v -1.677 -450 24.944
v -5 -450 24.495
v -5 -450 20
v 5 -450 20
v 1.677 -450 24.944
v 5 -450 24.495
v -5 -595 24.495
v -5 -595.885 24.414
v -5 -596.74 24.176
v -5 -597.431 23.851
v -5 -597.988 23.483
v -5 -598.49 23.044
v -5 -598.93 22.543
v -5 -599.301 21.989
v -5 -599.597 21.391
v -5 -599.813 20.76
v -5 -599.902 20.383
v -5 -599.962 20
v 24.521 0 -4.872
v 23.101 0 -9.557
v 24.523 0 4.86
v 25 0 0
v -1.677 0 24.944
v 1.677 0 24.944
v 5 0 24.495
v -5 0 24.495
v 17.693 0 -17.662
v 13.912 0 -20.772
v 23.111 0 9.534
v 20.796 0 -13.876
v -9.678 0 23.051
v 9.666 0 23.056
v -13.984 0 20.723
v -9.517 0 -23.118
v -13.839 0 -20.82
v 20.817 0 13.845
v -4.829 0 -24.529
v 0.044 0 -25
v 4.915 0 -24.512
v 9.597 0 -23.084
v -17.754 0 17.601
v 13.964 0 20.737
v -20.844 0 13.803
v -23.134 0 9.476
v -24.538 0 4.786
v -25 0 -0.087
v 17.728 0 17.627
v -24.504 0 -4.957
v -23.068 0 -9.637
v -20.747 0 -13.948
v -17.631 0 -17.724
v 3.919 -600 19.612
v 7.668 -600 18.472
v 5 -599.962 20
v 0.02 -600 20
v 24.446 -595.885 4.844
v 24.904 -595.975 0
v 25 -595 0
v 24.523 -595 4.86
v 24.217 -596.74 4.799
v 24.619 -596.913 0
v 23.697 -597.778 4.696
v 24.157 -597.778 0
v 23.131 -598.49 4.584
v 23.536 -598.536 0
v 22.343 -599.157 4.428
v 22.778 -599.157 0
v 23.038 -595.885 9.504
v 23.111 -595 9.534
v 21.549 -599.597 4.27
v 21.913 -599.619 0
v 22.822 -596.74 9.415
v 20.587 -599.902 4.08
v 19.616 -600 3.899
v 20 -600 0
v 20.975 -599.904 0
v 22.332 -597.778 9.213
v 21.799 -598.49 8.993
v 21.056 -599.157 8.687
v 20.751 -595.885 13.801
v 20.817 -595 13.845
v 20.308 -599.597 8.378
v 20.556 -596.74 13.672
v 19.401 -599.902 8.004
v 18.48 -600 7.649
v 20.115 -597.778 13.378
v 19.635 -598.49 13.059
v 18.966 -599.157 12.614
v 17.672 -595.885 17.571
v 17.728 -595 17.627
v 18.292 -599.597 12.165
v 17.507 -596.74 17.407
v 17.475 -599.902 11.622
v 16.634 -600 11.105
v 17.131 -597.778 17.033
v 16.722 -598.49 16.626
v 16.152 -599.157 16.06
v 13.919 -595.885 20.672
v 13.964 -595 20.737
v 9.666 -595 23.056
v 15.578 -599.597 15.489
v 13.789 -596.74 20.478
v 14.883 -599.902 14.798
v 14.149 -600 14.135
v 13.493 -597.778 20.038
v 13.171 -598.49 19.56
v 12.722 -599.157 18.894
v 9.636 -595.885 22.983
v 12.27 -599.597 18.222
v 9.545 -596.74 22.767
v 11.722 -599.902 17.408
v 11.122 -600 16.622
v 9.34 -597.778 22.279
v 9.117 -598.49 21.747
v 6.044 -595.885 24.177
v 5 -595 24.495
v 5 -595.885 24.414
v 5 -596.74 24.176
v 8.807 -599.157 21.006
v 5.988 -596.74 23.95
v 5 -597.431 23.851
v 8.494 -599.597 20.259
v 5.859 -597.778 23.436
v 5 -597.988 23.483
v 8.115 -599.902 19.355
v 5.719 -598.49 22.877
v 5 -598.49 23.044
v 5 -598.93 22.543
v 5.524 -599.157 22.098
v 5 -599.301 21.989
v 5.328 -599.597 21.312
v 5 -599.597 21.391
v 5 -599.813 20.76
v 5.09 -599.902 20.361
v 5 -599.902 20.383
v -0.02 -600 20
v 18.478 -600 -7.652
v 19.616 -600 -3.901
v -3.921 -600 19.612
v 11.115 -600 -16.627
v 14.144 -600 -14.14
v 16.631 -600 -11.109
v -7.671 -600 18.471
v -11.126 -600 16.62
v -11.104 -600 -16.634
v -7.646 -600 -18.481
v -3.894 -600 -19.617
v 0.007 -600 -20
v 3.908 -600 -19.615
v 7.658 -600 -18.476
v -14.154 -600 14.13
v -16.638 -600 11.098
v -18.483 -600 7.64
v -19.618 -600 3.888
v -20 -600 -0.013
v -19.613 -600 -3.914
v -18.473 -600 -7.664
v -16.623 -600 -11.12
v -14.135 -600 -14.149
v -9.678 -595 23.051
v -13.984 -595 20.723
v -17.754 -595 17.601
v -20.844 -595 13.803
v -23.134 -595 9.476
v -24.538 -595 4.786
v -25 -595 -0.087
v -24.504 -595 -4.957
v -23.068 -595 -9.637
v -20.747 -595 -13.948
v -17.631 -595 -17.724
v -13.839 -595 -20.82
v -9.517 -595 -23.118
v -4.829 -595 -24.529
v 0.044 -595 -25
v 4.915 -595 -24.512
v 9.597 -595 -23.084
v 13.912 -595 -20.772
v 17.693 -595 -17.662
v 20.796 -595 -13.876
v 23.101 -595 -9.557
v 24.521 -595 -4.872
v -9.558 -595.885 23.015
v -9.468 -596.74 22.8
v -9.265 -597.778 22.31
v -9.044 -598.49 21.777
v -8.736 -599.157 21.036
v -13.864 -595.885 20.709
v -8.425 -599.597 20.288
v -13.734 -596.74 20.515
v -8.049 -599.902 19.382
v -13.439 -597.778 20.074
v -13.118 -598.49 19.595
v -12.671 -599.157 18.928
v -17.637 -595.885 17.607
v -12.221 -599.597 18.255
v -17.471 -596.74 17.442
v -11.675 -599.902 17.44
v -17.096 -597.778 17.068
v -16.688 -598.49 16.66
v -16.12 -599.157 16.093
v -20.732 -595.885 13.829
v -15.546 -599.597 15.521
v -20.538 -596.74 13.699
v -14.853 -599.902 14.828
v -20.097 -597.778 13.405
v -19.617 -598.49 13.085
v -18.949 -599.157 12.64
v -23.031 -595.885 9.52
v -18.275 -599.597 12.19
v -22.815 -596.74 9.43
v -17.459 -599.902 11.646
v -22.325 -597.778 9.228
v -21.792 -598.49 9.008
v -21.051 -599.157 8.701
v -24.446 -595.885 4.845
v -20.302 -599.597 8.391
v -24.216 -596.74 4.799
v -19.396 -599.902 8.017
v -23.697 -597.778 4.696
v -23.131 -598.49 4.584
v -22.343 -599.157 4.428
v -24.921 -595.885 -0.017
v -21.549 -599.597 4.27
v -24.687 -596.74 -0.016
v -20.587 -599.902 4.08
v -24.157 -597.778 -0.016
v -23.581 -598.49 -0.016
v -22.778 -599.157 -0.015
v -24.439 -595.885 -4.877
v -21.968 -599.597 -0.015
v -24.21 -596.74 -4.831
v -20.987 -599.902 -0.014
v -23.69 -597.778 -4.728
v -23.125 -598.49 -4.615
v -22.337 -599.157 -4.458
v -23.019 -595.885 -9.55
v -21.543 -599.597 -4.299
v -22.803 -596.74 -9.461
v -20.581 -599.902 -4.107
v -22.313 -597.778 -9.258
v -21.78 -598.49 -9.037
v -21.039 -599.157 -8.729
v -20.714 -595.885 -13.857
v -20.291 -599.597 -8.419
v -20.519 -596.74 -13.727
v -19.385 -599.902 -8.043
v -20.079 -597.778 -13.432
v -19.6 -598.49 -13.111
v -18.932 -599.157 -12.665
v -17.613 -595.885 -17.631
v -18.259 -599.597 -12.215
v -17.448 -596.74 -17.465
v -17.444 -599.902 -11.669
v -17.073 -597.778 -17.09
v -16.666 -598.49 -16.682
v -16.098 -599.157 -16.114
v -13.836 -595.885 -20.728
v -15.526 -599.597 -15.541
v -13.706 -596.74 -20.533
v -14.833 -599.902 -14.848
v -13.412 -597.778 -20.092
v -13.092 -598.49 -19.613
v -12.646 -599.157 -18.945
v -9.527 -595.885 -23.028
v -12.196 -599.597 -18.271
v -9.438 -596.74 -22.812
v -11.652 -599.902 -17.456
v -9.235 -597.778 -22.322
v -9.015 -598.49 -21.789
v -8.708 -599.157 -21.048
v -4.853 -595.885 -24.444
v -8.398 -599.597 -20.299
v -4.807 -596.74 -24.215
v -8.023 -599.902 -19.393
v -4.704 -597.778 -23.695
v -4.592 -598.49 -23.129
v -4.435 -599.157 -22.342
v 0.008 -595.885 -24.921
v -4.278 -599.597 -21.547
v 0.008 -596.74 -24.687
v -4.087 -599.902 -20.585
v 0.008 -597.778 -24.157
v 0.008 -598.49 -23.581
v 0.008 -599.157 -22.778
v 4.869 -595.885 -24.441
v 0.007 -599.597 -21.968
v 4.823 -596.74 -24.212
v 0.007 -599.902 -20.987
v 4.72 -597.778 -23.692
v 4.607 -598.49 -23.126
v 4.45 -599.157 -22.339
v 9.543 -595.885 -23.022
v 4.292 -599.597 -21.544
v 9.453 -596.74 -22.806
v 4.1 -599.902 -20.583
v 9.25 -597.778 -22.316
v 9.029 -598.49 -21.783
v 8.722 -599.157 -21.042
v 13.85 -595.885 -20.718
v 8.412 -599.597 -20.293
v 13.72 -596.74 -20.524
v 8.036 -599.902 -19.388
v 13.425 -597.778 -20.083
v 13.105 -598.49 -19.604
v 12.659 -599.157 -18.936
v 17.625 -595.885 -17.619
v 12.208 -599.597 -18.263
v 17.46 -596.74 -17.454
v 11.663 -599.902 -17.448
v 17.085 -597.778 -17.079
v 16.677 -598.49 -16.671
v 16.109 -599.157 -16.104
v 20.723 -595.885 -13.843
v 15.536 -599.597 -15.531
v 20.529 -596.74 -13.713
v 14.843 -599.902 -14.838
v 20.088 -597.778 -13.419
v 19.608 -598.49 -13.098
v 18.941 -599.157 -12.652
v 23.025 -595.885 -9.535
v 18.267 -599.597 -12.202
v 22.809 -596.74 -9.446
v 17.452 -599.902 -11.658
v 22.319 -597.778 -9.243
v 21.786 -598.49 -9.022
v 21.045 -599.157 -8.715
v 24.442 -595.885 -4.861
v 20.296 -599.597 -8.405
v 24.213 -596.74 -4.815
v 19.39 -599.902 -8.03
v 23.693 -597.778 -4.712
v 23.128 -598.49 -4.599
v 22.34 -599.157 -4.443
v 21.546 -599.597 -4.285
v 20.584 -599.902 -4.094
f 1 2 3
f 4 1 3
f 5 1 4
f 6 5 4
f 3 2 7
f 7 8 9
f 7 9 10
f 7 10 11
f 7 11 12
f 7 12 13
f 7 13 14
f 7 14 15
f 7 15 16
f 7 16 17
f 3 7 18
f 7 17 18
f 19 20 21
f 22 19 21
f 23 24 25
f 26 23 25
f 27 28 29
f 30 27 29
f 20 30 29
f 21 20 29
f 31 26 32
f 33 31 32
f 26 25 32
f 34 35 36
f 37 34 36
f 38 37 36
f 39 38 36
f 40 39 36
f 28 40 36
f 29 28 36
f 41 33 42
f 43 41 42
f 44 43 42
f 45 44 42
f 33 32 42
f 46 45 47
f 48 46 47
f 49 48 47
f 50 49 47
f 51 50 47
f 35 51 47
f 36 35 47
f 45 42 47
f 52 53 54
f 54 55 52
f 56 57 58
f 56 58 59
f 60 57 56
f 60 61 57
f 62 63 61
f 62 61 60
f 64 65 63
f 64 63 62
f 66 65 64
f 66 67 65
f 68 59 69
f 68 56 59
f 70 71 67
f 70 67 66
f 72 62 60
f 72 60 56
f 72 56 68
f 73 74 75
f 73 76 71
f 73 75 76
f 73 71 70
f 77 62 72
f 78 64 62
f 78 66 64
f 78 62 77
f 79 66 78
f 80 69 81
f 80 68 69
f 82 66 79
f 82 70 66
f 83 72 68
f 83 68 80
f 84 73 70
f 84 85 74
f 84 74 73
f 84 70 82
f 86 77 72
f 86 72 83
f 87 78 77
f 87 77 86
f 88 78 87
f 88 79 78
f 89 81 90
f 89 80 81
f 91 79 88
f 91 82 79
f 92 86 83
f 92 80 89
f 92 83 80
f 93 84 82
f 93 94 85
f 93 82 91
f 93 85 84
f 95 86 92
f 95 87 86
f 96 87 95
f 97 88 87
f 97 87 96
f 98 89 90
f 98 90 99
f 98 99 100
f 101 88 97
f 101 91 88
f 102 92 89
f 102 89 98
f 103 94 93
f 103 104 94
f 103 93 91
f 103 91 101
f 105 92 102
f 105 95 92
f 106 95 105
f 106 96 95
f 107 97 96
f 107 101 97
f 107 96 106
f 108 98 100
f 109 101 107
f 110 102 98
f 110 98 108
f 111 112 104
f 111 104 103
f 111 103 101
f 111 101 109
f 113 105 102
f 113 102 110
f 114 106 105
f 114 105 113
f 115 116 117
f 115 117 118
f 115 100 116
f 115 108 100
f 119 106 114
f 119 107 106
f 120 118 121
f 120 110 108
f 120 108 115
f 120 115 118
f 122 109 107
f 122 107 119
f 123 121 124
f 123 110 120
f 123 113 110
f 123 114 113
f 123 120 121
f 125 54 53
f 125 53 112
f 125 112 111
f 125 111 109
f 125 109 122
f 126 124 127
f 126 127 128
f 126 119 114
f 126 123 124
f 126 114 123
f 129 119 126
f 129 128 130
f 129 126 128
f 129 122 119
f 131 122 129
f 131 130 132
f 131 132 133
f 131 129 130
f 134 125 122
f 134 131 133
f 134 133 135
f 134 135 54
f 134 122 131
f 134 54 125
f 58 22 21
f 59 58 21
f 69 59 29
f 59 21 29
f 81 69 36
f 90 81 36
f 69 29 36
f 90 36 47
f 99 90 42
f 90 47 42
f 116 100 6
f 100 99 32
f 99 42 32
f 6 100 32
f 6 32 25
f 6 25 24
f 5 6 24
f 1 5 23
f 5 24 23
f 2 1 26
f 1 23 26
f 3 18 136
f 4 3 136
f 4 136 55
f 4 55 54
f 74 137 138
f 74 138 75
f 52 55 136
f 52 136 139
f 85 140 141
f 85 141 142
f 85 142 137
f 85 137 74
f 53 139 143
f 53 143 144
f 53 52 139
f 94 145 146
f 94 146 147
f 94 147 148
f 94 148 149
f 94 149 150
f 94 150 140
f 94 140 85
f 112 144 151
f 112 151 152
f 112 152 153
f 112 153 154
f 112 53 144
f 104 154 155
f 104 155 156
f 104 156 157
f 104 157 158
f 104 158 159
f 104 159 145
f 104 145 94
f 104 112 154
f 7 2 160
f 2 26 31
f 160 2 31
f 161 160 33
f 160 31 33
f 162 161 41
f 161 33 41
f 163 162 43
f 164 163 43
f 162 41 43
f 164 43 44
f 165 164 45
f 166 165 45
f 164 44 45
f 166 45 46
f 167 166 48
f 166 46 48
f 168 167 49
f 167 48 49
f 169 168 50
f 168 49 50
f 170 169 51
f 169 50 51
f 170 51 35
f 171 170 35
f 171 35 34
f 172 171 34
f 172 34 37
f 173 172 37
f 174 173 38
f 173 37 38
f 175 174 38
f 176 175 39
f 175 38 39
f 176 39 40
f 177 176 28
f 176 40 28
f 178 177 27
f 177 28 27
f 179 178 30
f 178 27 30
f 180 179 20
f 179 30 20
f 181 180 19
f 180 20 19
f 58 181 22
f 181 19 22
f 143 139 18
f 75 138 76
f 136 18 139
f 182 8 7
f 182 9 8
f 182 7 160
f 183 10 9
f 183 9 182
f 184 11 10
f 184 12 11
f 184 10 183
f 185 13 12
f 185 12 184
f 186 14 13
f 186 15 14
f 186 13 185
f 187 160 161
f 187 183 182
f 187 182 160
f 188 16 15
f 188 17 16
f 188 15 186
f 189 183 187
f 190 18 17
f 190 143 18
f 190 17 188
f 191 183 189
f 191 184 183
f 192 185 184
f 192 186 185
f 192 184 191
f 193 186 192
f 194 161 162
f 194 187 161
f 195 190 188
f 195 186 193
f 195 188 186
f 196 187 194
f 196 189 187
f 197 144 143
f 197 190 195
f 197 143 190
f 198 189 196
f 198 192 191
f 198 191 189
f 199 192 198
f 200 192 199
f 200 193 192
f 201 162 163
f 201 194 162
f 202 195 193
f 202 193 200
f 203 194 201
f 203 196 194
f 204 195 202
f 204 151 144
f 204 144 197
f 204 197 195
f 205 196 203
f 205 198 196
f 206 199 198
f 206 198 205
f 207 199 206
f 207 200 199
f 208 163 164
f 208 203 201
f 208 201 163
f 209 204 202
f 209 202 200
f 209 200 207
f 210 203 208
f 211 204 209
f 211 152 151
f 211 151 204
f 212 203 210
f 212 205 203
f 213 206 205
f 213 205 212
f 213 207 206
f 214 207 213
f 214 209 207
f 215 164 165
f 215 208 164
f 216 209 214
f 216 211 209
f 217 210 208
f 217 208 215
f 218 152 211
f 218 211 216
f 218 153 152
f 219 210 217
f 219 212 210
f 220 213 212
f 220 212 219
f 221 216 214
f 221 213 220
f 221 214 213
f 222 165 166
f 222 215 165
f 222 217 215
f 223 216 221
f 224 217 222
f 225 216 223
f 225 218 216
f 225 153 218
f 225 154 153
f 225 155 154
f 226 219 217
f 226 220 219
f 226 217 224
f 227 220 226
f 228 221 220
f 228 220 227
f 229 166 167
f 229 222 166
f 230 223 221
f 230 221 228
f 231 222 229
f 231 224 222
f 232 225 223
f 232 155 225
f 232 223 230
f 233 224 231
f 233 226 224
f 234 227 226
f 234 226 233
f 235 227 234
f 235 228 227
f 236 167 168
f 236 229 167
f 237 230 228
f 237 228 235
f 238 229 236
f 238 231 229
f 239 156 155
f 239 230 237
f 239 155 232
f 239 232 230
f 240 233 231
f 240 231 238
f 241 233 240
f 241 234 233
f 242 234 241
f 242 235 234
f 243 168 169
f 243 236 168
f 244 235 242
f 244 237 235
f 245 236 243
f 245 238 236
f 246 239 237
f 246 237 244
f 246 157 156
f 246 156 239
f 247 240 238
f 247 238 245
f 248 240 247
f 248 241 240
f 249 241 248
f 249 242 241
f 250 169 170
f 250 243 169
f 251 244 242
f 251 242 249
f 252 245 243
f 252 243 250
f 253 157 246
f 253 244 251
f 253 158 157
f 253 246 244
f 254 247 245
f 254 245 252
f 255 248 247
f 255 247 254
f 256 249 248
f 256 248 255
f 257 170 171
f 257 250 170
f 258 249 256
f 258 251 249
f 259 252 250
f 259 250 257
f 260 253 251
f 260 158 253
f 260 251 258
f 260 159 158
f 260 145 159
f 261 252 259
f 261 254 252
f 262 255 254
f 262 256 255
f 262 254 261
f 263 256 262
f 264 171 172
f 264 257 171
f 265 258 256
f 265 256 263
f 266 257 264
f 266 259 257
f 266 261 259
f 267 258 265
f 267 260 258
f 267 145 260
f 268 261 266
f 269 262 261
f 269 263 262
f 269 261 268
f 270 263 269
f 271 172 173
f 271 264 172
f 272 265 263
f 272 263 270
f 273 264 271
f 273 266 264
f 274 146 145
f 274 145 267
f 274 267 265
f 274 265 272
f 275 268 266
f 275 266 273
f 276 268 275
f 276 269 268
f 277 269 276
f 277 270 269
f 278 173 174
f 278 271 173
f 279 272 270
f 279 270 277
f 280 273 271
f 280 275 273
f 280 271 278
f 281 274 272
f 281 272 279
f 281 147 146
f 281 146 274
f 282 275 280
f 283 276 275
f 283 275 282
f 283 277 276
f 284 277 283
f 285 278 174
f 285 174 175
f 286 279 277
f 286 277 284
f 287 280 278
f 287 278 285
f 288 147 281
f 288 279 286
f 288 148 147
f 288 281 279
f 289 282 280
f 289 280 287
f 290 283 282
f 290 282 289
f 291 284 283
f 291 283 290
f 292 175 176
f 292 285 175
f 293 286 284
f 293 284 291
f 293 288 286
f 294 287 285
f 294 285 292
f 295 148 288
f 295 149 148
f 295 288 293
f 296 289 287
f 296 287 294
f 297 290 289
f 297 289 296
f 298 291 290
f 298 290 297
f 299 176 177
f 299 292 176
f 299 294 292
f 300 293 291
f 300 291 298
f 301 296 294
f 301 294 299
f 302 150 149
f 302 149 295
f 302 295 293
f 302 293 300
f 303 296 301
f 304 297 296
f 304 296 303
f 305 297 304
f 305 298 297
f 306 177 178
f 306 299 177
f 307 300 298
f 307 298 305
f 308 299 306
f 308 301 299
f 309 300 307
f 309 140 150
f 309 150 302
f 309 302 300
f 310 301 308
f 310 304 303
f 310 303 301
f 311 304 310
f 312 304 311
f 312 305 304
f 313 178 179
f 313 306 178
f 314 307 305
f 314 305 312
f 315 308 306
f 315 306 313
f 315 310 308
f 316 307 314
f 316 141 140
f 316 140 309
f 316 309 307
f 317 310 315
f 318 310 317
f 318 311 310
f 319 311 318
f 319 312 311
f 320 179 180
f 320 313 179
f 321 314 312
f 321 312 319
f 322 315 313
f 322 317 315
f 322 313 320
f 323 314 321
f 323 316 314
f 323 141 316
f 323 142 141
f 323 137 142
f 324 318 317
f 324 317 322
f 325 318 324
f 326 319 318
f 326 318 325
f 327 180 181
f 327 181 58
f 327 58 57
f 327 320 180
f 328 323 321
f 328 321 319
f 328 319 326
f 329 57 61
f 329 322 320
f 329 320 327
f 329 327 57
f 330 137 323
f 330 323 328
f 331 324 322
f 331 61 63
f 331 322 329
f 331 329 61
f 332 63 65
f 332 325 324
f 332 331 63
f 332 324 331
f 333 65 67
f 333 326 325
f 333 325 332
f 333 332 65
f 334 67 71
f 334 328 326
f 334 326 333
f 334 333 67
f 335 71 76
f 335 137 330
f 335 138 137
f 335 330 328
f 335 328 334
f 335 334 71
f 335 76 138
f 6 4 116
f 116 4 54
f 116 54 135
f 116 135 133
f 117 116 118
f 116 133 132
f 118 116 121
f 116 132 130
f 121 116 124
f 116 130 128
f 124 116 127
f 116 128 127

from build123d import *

# Parameters (mm, degrees)
F1_DEPTH = 600
F3_DEPTH = 150
F4_R     = 4.99999


# Not quite as in the source:
# - a fillet or chamfer is up to 0.001 mm smaller than in the source, because OpenCascade refuses the exact size


with BuildPart() as f1:
    # F0 (on Front) → F1 (new body)
    with BuildSketch(Plane.XZ):
        with BuildLine():
            ThreePointArc((-5, 24.4948974278), (-15.8113883008, -19.364916731), (25, 0))
            ThreePointArc((25, 0), (19.364916731, 15.8113883008), (5, 24.4948974278))
            Line((5, 24.4948974278), (5, 20))
            Line((5, 20), (0, 20))
            Line((0, 20), (-5, 20))
            Line((-5, 20), (-5, 24.4948974278))
        make_face()
        with BuildLine():
            Line((5, 20), (5, 24.4948974278))
            ThreePointArc((5, 24.4948974278), (0, 25), (-5, 24.4948974278))
            Line((-5, 24.4948974278), (-5, 20))
            Line((-5, 20), (0, 20))
            Line((0, 20), (5, 20))
        make_face()
    extrude(amount=F1_DEPTH)

    # F2 (on face) → F3 (cut)
    with BuildSketch(Plane.XZ.offset(600)):
        with BuildLine():
            Line((-5, 20), (0, 20))
            Line((0, 20), (5, 20))
            Line((5, 20), (5, 24.4948974278))
            ThreePointArc((5, 24.4948974278), (0, 25), (-5, 24.4948974278))
            Line((-5, 24.4948974278), (-5, 20))
        make_face()
    extrude(amount=-F3_DEPTH, mode=Mode.SUBTRACT)

    # F4 (radius 5 in the source; OpenCascade refuses exactly that, so slightly less here)
    f4_edges = [f1.edges().sort_by_distance(p)[0] for p in [
        (-15.811388, -600, -19.364917),
    ]]
    fillet(f4_edges, radius=F4_R)


solid = f1.part
